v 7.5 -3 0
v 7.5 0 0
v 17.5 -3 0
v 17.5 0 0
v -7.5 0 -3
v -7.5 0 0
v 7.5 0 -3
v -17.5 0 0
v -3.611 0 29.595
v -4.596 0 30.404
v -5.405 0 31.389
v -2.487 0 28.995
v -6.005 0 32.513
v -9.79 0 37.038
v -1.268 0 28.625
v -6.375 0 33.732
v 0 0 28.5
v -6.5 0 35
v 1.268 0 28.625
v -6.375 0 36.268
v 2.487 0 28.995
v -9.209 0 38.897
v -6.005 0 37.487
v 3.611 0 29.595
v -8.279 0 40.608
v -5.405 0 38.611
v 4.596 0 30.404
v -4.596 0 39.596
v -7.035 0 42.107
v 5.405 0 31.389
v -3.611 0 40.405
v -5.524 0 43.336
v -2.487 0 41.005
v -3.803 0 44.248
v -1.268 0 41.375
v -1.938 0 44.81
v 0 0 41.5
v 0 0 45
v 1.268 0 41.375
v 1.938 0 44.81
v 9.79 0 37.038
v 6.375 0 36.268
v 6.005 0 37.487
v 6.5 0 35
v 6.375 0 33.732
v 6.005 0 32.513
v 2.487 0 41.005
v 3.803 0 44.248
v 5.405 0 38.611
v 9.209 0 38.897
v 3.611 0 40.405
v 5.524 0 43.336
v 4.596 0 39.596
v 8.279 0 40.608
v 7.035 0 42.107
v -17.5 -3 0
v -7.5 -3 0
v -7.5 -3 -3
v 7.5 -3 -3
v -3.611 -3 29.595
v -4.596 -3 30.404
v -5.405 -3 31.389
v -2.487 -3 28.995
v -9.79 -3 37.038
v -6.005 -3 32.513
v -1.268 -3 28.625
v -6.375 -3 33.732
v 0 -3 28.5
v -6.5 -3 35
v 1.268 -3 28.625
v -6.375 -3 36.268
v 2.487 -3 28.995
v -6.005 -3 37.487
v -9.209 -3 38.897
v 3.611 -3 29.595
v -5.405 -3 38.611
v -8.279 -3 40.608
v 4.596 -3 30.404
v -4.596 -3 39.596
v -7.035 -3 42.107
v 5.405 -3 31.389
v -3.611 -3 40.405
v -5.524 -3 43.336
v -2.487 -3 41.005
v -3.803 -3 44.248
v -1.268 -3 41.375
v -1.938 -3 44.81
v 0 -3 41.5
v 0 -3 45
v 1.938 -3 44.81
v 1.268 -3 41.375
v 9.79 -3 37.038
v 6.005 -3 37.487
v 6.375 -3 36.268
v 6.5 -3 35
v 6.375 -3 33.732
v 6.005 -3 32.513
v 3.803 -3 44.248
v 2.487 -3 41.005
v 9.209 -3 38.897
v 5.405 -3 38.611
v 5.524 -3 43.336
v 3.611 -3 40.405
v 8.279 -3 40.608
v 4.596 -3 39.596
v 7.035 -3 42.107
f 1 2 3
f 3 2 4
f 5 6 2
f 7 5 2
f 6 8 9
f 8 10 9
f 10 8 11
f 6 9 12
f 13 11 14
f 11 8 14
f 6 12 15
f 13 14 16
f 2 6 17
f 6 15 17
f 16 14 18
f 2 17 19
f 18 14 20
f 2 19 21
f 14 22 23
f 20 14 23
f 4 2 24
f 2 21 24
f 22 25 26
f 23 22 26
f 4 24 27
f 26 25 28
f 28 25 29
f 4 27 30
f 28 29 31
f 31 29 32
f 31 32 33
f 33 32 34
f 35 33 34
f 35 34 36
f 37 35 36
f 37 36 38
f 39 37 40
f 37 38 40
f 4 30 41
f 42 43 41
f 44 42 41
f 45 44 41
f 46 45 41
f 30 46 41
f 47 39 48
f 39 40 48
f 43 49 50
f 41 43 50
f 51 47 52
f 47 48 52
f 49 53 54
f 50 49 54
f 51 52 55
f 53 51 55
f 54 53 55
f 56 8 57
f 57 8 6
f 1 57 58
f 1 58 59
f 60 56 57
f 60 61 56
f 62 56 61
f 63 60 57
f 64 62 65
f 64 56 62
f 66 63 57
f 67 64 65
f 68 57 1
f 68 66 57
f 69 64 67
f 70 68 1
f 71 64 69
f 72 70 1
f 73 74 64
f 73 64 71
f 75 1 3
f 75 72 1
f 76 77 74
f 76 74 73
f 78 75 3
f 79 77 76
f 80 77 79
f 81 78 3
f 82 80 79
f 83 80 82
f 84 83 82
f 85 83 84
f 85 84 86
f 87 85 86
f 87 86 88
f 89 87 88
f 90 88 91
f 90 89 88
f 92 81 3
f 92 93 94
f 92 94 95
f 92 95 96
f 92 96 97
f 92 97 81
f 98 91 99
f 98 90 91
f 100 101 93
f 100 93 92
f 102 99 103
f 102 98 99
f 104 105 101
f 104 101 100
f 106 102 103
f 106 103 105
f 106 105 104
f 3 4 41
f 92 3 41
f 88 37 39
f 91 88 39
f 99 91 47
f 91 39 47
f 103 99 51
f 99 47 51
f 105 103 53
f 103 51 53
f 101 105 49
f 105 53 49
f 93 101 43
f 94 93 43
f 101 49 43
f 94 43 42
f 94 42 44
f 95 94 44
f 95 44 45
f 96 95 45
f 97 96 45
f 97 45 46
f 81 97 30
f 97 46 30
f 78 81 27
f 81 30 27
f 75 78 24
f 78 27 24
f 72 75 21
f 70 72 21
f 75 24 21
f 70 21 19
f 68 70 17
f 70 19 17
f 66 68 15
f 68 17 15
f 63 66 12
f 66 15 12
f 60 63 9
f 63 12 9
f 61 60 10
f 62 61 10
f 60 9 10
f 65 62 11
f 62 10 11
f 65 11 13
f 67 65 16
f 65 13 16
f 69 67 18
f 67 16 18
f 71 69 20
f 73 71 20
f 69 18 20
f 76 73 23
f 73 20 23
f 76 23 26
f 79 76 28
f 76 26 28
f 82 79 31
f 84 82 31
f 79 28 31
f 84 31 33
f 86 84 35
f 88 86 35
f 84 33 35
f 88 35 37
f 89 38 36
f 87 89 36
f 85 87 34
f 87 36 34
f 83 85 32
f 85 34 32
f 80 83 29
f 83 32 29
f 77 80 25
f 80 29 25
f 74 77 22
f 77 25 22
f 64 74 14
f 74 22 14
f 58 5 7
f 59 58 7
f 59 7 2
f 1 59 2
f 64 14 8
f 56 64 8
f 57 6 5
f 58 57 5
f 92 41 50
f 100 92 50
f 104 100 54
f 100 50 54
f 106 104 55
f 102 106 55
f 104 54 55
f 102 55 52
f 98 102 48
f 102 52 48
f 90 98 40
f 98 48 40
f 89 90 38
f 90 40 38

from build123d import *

# Parameters (mm, degrees)
F1_DEPTH = 3


with BuildPart() as f1:
    # F0 (on Front) → F1 (new body)
    with BuildSketch(Plane.XZ):
        with BuildLine():
            ThreePointArc((0, 45), (-6.309545, 42.758198), (-9.790141, 37.037927))
            Line((-9.790141, 37.037927), (-17.5, 0))
            Line((-17.5, 0), (-7.5, 0))
            Line((-7.5, 0), (-7.5, -3))
            Line((-7.5, -3), (0, -3))
            Line((0, -3), (7.5, -3))
            Line((7.5, -3), (7.5, 0))
            Line((7.5, 0), (17.5, 0))
            Line((17.5, 0), (9.790141, 37.037927))
            ThreePointArc((9.790141, 37.037927), (6.309545, 42.758198), (0, 45))
        make_face()
        with BuildLine():
            ThreePointArc((0, 28.5), (-6.5, 35), (0, 41.5))
            ThreePointArc((0, 41.5), (6.5, 35), (0, 28.5))
        make_face(mode=Mode.SUBTRACT)
    extrude(amount=F1_DEPTH)


solid = f1.part
